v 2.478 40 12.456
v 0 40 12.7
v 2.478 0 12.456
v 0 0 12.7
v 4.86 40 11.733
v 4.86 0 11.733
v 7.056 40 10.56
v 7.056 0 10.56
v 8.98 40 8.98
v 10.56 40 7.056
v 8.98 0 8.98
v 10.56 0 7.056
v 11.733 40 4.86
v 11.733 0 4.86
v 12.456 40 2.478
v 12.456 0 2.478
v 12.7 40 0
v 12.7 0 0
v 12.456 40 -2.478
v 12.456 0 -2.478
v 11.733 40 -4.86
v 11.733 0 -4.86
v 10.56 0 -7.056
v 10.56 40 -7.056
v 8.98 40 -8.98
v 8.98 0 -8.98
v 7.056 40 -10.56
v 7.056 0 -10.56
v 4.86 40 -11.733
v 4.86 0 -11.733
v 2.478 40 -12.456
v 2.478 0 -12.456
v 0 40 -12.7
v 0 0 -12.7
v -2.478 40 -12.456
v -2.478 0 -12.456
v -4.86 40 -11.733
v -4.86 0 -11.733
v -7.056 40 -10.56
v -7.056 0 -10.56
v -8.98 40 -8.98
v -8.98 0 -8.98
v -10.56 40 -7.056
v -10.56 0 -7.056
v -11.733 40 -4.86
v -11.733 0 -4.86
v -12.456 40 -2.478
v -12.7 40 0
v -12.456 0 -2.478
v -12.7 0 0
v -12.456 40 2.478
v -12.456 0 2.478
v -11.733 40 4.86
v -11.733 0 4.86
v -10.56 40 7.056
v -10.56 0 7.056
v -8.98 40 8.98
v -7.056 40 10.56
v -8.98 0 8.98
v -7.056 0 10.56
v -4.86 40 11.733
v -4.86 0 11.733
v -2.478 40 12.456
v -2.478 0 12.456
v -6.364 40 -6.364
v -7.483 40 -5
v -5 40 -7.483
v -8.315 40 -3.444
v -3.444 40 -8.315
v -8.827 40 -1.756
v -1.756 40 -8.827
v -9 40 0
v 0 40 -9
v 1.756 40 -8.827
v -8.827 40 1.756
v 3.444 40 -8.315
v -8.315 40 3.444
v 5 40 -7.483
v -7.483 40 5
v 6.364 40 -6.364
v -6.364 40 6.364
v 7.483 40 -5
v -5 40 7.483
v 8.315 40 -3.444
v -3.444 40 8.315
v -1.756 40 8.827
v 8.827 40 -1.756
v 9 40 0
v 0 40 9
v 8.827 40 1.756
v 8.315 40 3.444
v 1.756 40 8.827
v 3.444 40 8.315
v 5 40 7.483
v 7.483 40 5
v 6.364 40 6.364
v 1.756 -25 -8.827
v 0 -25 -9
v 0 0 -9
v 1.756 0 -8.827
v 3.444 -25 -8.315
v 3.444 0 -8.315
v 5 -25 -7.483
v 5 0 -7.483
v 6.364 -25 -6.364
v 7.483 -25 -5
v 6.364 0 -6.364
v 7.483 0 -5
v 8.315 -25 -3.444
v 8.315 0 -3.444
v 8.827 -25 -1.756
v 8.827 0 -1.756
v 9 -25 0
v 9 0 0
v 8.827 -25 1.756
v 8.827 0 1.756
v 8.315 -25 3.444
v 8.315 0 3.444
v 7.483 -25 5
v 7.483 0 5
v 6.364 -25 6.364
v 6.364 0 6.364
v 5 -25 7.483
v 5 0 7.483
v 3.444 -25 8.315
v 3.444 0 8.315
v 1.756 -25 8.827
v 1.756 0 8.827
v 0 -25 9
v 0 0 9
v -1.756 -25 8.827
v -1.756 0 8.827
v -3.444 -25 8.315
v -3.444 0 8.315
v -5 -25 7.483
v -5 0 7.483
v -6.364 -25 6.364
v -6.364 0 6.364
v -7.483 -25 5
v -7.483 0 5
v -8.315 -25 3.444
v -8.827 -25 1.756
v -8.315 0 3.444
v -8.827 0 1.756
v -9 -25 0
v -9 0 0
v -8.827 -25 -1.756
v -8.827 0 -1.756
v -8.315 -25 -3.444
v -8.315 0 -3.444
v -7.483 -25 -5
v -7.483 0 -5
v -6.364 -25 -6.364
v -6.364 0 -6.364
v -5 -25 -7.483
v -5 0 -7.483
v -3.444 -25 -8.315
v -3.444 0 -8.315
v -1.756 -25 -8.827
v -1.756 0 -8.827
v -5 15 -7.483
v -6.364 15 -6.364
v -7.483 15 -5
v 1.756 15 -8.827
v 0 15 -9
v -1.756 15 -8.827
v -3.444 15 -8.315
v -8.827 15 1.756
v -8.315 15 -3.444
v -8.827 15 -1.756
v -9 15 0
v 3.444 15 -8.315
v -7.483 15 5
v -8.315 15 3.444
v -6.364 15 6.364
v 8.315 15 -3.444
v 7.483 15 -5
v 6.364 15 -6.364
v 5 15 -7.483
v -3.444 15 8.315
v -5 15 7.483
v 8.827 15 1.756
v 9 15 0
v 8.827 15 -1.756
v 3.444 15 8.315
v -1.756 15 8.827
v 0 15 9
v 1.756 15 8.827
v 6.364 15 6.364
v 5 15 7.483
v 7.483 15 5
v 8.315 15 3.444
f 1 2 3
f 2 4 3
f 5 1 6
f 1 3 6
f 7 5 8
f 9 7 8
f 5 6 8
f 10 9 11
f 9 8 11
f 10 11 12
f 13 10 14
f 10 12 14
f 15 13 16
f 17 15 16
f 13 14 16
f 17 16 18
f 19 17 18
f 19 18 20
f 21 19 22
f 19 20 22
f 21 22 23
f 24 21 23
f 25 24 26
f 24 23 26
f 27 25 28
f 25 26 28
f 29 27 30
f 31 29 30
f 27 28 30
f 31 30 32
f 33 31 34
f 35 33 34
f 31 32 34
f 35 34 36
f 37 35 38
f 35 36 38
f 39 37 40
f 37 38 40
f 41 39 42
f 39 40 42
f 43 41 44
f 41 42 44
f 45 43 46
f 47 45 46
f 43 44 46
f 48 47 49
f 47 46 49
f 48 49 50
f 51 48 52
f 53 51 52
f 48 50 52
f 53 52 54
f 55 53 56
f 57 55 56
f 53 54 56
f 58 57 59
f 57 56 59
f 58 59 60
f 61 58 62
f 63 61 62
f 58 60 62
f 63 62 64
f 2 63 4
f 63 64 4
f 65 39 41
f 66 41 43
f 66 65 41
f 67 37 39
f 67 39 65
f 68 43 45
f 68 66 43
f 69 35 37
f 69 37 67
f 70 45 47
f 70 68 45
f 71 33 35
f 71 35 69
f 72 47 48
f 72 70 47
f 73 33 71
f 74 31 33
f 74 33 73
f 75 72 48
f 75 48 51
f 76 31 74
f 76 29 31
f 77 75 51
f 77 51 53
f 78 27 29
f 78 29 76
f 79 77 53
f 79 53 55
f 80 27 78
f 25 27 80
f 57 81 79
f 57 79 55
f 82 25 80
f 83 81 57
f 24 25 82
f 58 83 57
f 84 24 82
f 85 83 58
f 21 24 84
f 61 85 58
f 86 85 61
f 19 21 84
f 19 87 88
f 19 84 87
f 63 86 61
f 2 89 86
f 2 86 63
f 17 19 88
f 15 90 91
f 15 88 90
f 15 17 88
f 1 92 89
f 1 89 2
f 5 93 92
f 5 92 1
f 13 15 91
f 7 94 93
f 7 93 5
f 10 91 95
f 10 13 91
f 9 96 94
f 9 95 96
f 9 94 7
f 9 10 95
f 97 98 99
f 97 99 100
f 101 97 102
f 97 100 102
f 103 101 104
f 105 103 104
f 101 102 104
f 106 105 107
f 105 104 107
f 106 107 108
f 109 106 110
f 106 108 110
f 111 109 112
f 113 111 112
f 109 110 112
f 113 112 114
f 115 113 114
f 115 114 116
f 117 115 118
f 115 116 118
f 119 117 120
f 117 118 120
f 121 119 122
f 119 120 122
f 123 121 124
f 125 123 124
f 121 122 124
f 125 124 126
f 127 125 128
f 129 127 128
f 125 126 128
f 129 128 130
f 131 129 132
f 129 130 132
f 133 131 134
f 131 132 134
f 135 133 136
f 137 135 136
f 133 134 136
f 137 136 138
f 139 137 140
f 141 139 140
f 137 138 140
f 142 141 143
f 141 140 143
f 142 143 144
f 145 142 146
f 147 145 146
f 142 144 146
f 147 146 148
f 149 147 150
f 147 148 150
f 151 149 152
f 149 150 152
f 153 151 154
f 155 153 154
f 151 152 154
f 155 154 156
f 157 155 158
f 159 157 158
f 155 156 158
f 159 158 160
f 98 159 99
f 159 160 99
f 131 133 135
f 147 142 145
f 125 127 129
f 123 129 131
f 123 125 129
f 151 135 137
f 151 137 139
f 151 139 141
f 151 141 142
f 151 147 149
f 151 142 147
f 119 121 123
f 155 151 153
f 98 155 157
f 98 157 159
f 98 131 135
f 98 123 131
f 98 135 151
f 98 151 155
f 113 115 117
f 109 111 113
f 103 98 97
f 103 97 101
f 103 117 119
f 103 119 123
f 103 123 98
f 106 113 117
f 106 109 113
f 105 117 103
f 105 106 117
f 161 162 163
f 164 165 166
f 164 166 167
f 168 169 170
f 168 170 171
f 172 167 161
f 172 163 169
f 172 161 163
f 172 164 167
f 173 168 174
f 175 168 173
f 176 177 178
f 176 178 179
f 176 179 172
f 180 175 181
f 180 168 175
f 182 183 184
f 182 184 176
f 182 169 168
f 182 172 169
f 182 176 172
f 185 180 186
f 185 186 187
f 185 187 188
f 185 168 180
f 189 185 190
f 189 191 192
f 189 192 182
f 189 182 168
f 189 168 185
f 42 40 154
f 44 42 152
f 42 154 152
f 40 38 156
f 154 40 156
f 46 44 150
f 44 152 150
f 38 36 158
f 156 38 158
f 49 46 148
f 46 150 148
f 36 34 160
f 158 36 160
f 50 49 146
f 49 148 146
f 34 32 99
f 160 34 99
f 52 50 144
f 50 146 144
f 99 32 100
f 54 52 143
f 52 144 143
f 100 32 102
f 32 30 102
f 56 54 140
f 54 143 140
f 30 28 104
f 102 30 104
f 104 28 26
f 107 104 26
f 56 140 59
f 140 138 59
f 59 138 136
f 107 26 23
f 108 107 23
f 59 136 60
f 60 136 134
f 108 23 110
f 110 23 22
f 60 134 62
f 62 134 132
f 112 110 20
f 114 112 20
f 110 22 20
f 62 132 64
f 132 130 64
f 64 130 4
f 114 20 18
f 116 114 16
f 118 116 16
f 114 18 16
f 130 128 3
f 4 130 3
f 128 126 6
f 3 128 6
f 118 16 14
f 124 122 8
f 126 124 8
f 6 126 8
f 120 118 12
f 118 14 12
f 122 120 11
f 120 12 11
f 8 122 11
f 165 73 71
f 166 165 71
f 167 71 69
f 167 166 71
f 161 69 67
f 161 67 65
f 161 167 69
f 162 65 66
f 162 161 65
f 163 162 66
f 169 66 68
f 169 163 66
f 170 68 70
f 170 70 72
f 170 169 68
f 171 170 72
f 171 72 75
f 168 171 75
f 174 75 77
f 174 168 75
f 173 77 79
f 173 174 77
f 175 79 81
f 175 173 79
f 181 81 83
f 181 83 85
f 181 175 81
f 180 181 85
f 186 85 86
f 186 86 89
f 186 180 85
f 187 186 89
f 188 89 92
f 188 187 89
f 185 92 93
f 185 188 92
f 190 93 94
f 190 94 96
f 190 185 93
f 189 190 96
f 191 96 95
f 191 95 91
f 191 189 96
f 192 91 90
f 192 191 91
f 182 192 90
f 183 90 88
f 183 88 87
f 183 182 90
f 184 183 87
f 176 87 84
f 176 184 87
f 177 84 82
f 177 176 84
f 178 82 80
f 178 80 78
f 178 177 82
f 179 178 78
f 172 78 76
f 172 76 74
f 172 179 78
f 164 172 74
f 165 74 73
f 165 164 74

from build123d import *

# Parameters (mm, degrees)
SKETCH1_R           = 12.7
BOSS_EXTRUDE1_DEPTH = 15
SKETCH2_R           = 9
BOSS_EXTRUDE2_DEPTH = 25
SKETCH3_R           = 12.7
SKETCH3_R_2         = 9
BOSS_EXTRUDE3_DEPTH = 25


with BuildPart() as part:
    # Sketch1 → Boss-Extrude1 (new body)
    with BuildSketch(Plane(origin=(0, 0, 0), x_dir=(1, 0, 0), z_dir=(0, 1, 0))):
        with Locations(Location((0, 0, 0), (0, 0, 270))):
            Circle(SKETCH1_R)
    extrude(amount=BOSS_EXTRUDE1_DEPTH)

    # Sketch2 → Boss-Extrude2 (add)
    with BuildSketch(Plane.XZ):
        with Locations(Location((0, 0, 0), (0, 0, 270))):
            Circle(SKETCH2_R)
    extrude(amount=BOSS_EXTRUDE2_DEPTH)

    # Sketch3 → Boss-Extrude3 (add)
    with BuildSketch(Plane(origin=(0, 15, 0), x_dir=(1, 0, 0), z_dir=(0, 1, 0))):
        with Locations(Location((0, 0, 0), (0, 0, 270))):
            Circle(SKETCH3_R)
        with Locations(Location((0, 0, 0), (0, 0, 90))):
            Circle(SKETCH3_R_2, mode=Mode.SUBTRACT)
    extrude(amount=BOSS_EXTRUDE3_DEPTH)


solid = part.part
